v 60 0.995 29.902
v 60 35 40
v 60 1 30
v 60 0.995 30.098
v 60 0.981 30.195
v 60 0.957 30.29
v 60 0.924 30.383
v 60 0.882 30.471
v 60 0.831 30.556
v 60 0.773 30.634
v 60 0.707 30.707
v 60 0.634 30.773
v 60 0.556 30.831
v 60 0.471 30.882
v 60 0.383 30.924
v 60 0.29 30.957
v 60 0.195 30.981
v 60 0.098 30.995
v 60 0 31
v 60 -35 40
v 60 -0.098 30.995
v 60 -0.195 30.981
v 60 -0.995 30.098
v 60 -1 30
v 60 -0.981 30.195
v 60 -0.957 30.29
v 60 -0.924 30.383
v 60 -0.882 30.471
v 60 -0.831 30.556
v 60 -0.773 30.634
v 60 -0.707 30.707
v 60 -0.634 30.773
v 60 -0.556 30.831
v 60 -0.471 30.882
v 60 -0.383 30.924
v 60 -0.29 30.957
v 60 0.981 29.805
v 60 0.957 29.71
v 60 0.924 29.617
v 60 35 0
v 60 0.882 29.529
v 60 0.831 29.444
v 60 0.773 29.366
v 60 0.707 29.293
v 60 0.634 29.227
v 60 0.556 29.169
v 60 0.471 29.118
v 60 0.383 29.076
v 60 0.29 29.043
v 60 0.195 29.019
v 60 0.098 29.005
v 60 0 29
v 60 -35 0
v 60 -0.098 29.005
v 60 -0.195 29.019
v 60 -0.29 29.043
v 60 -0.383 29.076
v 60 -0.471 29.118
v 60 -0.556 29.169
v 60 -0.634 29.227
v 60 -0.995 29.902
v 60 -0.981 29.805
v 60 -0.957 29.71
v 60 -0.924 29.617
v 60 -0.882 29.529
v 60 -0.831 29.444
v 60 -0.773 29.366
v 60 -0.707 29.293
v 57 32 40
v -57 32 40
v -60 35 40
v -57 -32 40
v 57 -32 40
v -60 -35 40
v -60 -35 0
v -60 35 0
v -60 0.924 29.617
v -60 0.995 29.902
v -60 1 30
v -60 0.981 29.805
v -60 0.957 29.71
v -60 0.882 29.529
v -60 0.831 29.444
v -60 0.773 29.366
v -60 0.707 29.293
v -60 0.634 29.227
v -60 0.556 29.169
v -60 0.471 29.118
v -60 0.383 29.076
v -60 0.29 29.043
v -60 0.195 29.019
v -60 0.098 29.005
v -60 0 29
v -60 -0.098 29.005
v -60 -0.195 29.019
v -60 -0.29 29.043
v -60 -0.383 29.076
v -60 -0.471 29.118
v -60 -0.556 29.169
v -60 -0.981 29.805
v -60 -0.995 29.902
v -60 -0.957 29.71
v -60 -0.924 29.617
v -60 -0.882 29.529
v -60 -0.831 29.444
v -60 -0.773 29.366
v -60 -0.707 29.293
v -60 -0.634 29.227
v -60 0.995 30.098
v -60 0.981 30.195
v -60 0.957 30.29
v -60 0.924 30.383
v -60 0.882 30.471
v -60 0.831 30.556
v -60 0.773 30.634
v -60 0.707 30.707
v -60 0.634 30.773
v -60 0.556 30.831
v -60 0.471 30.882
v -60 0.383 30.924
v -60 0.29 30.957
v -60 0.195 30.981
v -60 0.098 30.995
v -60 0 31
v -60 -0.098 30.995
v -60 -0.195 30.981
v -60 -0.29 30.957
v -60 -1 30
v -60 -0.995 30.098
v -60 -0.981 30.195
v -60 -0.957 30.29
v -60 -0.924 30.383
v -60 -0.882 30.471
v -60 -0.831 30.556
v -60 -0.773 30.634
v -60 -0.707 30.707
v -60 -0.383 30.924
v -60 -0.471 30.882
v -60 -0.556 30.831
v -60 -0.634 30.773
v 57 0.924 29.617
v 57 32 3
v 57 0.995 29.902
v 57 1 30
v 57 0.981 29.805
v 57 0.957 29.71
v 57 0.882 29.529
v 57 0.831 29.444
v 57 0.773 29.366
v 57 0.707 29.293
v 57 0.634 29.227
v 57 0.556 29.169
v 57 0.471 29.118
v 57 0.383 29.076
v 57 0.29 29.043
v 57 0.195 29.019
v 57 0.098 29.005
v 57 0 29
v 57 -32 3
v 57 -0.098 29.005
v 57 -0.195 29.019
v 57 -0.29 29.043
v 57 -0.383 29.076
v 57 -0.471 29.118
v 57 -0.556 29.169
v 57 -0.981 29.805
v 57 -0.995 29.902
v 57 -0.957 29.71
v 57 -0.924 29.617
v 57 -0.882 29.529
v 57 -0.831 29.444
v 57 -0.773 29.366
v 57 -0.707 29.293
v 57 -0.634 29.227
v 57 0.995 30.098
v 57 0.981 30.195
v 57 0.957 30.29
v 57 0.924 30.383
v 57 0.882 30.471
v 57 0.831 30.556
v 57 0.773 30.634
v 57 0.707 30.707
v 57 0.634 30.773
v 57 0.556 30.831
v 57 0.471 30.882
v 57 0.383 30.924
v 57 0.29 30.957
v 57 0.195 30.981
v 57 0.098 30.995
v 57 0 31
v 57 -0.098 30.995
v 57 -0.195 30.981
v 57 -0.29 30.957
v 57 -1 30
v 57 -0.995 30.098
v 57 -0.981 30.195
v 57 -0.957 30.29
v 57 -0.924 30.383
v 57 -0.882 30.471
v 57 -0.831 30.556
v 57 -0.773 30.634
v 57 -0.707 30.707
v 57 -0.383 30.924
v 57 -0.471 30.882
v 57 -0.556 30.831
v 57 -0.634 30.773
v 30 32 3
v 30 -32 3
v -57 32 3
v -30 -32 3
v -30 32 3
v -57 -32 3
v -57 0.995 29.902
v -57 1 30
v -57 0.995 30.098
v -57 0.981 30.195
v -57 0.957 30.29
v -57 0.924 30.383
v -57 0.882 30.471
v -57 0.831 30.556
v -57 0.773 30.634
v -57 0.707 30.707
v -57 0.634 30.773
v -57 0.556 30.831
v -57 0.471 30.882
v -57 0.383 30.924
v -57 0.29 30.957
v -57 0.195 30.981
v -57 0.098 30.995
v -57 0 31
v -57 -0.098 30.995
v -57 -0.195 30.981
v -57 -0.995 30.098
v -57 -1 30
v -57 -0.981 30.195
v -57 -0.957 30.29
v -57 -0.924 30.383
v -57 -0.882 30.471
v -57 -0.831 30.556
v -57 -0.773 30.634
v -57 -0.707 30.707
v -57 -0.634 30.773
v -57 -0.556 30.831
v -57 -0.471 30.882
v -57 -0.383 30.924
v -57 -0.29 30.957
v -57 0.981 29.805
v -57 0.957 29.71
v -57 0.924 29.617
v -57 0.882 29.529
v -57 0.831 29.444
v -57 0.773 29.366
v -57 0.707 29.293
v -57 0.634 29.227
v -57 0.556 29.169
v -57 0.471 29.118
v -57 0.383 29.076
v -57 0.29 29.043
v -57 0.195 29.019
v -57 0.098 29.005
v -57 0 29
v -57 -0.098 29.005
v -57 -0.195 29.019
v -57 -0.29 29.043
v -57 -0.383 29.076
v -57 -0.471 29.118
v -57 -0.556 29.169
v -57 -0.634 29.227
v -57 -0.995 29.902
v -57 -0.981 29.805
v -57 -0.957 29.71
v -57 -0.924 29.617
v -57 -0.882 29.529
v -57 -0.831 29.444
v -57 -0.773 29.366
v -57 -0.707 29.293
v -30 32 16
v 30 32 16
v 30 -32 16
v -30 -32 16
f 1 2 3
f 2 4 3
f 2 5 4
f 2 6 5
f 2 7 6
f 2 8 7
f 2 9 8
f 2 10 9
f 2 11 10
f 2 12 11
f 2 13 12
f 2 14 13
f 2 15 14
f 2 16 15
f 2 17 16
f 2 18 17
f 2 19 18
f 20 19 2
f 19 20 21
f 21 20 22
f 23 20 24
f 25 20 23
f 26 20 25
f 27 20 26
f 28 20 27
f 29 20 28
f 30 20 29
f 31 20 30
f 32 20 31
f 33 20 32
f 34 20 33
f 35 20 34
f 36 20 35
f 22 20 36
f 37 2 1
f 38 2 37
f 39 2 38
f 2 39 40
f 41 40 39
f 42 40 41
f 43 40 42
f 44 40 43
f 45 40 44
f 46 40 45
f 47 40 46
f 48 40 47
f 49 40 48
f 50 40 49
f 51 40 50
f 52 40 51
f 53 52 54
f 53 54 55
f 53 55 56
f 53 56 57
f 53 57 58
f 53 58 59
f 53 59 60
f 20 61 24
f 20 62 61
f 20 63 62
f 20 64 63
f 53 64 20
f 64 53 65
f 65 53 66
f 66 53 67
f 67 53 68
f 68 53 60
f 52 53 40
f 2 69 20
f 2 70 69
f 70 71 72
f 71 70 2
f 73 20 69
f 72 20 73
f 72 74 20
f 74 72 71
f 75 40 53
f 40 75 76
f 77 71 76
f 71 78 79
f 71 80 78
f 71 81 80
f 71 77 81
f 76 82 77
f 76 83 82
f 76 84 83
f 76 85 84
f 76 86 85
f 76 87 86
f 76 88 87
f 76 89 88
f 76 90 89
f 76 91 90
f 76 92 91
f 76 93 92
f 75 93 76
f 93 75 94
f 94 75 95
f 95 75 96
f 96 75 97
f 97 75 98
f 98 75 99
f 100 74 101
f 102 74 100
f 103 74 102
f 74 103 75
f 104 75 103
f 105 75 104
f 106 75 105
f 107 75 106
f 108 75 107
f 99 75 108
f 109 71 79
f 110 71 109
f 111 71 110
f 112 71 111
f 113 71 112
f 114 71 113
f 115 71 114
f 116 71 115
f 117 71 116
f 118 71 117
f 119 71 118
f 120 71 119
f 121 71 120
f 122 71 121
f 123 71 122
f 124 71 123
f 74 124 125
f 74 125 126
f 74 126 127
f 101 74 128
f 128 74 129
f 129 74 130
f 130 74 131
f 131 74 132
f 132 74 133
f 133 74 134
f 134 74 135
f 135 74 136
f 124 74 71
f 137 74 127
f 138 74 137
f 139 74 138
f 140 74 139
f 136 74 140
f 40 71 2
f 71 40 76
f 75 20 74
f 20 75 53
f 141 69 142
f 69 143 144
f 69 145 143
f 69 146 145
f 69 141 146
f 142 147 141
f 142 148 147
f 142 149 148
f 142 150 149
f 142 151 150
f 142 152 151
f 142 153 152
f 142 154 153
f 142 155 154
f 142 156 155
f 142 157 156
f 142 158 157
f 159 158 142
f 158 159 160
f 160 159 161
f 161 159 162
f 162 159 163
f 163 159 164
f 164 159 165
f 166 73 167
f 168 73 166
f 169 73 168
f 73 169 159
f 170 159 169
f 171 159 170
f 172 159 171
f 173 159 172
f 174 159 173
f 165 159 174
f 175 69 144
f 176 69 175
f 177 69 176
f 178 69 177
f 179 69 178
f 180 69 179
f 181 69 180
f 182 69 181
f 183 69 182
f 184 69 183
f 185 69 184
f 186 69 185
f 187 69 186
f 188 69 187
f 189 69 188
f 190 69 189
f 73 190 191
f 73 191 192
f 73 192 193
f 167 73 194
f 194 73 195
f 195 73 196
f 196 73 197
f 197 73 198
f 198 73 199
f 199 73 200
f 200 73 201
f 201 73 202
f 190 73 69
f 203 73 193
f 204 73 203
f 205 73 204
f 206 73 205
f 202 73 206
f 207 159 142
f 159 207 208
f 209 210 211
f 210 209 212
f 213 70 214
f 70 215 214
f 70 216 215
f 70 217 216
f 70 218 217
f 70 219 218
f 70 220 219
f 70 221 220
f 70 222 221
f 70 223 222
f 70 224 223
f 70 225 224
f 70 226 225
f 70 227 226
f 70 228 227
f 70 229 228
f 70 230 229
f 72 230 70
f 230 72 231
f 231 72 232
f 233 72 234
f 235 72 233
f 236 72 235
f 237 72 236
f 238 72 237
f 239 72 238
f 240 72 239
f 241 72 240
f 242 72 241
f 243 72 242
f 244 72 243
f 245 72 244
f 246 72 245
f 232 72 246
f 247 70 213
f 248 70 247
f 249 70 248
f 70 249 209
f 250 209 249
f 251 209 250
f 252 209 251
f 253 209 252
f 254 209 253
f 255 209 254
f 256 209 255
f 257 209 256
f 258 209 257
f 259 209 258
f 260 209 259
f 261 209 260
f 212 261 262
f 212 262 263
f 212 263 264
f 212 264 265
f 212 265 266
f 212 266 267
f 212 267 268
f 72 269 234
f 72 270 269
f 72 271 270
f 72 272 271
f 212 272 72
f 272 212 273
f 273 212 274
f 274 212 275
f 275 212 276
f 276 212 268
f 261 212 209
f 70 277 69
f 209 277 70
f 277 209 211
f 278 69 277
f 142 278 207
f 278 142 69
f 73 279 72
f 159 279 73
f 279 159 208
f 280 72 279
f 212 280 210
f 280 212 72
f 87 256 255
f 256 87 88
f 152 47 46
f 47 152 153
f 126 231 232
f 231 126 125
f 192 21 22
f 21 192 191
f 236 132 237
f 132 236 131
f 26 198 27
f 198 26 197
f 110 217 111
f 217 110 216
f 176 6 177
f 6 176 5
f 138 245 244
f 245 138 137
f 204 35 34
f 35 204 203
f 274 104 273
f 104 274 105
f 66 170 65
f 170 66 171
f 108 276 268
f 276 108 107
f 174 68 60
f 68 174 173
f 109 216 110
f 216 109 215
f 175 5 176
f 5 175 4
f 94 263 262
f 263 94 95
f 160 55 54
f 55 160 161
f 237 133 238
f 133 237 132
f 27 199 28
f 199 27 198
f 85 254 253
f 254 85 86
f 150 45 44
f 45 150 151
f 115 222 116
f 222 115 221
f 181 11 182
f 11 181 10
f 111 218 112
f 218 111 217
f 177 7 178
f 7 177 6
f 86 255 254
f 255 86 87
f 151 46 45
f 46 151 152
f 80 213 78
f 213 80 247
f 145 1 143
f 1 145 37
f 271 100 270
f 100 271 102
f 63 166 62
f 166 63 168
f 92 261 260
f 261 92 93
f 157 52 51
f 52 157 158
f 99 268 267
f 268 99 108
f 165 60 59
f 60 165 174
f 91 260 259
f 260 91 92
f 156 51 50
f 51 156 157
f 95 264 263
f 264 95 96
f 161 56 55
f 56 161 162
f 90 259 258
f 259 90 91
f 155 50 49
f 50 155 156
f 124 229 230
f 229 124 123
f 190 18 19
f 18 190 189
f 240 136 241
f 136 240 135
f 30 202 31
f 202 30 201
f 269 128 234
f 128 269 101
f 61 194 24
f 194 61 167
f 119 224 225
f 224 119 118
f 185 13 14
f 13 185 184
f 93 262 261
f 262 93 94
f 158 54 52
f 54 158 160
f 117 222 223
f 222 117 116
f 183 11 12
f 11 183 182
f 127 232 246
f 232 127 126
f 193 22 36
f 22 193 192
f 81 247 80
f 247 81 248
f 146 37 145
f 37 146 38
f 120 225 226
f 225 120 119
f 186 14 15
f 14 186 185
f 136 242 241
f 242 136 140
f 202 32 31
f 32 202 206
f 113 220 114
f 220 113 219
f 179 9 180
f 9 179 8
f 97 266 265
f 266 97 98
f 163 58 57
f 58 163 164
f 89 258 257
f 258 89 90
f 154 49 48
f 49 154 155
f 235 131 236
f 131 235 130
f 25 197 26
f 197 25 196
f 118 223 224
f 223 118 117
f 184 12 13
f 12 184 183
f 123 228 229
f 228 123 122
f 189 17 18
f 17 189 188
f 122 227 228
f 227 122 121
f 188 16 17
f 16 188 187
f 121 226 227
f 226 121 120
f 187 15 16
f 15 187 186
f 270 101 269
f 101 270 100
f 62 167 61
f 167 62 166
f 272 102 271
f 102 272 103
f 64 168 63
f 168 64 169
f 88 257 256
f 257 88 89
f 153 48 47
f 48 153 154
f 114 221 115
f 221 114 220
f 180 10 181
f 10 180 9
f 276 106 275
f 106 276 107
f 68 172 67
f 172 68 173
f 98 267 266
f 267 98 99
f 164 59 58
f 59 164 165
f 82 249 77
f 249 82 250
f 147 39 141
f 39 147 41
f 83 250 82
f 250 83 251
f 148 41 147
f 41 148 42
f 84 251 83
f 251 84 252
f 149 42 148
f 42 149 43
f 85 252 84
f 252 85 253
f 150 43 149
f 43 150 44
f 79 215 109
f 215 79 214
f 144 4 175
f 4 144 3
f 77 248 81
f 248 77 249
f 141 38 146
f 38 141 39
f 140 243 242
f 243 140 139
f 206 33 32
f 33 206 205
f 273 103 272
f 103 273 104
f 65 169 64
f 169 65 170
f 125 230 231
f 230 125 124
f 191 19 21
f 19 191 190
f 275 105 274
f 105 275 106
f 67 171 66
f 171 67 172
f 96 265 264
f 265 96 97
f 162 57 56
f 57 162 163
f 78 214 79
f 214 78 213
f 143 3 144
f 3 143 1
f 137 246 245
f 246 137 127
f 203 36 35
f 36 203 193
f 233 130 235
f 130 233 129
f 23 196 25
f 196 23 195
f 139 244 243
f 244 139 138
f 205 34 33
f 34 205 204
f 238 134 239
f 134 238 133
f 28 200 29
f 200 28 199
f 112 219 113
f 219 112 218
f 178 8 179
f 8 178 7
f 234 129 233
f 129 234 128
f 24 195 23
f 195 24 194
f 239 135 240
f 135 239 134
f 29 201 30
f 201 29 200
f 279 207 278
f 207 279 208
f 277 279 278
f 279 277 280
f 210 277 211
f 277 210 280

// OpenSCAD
// --- Dimensions (mm) ---
outer_x = 120;          // Total length of the tank
outer_y = 70;           // Total width of the tank
outer_z = 40;           // Total height of the tank
wall_thickness = 3;     // Thickness of the side walls
floor_thickness = 3;    // Thickness of the bottom floor

platform_length = 60;    // Length of the central platform along X
platform_height_from_floor = 13; // Height of the platform top relative to the inner floor
platform_width = outer_y - 2*wall_thickness; // Platform spans the full inner width (Y)

hole_diameter = 2;      // Diameter of the electrode wire holes
hole_y_pos = 0;         // Y position of the holes (centered on Y)
hole_z_pos = 30;        // Z position of the holes

// --- Constants ---
$fn = 64;

// --- Implementation ---

// The tank is built in one piece. 
// We start with the outer shell and subtract the interior volume.
// Then we add the platform inside.

module buffer_tank() {
    difference() {
        // Main Outer Body
        cube([outer_x, outer_y, outer_z]);

        // Interior Cavity
        // We subtract the cavity from the main body.
        // The cavity starts at floor_thickness and goes to the top.
        translate([wall_thickness, wall_thickness, floor_thickness]) {
            cube([outer_x - 2*wall_thickness, outer_y - 2*wall_thickness, outer_z]);
        }

        // Electrode Wire Holes
        // Holes are drilled through the X-walls at the ends.
        // The user specified y = 0 (center of Y) and z = 30.
        // To ensure a clean cut, we make the cylinder longer than the tank.
        // We use a small offset to ensure it cuts through the faces.
        translate([-1, outer_y/2, hole_z_pos])
            rotate([0, 90, 0])
                cylinder(d = hole_diameter, h = outer_x + 2);
    }

    // The Platform
    // The platform is inside the tank. 
    // It is centered in X.
    // Its top is at z = floor_thickness + platform_height_from_floor.
    // Its width is the inner width (outer_y - 2*wall_thickness).
    
    translate([
        (outer_x / 2) - (platform_length / 2), 
        wall_thickness, 
        floor_thickness
    ]) {
        cube([
            platform_length, 
            platform_width, 
            platform_height_from_floor
        ]);
    }
}

// Render the part
// The part is centered on the XY plane as requested.
// The bounding box will be X: -60 to 60, Y: -35 to 35, Z: 0 to 40.
translate([-outer_x/2, -outer_y/2, 0])
    buffer_tank();
